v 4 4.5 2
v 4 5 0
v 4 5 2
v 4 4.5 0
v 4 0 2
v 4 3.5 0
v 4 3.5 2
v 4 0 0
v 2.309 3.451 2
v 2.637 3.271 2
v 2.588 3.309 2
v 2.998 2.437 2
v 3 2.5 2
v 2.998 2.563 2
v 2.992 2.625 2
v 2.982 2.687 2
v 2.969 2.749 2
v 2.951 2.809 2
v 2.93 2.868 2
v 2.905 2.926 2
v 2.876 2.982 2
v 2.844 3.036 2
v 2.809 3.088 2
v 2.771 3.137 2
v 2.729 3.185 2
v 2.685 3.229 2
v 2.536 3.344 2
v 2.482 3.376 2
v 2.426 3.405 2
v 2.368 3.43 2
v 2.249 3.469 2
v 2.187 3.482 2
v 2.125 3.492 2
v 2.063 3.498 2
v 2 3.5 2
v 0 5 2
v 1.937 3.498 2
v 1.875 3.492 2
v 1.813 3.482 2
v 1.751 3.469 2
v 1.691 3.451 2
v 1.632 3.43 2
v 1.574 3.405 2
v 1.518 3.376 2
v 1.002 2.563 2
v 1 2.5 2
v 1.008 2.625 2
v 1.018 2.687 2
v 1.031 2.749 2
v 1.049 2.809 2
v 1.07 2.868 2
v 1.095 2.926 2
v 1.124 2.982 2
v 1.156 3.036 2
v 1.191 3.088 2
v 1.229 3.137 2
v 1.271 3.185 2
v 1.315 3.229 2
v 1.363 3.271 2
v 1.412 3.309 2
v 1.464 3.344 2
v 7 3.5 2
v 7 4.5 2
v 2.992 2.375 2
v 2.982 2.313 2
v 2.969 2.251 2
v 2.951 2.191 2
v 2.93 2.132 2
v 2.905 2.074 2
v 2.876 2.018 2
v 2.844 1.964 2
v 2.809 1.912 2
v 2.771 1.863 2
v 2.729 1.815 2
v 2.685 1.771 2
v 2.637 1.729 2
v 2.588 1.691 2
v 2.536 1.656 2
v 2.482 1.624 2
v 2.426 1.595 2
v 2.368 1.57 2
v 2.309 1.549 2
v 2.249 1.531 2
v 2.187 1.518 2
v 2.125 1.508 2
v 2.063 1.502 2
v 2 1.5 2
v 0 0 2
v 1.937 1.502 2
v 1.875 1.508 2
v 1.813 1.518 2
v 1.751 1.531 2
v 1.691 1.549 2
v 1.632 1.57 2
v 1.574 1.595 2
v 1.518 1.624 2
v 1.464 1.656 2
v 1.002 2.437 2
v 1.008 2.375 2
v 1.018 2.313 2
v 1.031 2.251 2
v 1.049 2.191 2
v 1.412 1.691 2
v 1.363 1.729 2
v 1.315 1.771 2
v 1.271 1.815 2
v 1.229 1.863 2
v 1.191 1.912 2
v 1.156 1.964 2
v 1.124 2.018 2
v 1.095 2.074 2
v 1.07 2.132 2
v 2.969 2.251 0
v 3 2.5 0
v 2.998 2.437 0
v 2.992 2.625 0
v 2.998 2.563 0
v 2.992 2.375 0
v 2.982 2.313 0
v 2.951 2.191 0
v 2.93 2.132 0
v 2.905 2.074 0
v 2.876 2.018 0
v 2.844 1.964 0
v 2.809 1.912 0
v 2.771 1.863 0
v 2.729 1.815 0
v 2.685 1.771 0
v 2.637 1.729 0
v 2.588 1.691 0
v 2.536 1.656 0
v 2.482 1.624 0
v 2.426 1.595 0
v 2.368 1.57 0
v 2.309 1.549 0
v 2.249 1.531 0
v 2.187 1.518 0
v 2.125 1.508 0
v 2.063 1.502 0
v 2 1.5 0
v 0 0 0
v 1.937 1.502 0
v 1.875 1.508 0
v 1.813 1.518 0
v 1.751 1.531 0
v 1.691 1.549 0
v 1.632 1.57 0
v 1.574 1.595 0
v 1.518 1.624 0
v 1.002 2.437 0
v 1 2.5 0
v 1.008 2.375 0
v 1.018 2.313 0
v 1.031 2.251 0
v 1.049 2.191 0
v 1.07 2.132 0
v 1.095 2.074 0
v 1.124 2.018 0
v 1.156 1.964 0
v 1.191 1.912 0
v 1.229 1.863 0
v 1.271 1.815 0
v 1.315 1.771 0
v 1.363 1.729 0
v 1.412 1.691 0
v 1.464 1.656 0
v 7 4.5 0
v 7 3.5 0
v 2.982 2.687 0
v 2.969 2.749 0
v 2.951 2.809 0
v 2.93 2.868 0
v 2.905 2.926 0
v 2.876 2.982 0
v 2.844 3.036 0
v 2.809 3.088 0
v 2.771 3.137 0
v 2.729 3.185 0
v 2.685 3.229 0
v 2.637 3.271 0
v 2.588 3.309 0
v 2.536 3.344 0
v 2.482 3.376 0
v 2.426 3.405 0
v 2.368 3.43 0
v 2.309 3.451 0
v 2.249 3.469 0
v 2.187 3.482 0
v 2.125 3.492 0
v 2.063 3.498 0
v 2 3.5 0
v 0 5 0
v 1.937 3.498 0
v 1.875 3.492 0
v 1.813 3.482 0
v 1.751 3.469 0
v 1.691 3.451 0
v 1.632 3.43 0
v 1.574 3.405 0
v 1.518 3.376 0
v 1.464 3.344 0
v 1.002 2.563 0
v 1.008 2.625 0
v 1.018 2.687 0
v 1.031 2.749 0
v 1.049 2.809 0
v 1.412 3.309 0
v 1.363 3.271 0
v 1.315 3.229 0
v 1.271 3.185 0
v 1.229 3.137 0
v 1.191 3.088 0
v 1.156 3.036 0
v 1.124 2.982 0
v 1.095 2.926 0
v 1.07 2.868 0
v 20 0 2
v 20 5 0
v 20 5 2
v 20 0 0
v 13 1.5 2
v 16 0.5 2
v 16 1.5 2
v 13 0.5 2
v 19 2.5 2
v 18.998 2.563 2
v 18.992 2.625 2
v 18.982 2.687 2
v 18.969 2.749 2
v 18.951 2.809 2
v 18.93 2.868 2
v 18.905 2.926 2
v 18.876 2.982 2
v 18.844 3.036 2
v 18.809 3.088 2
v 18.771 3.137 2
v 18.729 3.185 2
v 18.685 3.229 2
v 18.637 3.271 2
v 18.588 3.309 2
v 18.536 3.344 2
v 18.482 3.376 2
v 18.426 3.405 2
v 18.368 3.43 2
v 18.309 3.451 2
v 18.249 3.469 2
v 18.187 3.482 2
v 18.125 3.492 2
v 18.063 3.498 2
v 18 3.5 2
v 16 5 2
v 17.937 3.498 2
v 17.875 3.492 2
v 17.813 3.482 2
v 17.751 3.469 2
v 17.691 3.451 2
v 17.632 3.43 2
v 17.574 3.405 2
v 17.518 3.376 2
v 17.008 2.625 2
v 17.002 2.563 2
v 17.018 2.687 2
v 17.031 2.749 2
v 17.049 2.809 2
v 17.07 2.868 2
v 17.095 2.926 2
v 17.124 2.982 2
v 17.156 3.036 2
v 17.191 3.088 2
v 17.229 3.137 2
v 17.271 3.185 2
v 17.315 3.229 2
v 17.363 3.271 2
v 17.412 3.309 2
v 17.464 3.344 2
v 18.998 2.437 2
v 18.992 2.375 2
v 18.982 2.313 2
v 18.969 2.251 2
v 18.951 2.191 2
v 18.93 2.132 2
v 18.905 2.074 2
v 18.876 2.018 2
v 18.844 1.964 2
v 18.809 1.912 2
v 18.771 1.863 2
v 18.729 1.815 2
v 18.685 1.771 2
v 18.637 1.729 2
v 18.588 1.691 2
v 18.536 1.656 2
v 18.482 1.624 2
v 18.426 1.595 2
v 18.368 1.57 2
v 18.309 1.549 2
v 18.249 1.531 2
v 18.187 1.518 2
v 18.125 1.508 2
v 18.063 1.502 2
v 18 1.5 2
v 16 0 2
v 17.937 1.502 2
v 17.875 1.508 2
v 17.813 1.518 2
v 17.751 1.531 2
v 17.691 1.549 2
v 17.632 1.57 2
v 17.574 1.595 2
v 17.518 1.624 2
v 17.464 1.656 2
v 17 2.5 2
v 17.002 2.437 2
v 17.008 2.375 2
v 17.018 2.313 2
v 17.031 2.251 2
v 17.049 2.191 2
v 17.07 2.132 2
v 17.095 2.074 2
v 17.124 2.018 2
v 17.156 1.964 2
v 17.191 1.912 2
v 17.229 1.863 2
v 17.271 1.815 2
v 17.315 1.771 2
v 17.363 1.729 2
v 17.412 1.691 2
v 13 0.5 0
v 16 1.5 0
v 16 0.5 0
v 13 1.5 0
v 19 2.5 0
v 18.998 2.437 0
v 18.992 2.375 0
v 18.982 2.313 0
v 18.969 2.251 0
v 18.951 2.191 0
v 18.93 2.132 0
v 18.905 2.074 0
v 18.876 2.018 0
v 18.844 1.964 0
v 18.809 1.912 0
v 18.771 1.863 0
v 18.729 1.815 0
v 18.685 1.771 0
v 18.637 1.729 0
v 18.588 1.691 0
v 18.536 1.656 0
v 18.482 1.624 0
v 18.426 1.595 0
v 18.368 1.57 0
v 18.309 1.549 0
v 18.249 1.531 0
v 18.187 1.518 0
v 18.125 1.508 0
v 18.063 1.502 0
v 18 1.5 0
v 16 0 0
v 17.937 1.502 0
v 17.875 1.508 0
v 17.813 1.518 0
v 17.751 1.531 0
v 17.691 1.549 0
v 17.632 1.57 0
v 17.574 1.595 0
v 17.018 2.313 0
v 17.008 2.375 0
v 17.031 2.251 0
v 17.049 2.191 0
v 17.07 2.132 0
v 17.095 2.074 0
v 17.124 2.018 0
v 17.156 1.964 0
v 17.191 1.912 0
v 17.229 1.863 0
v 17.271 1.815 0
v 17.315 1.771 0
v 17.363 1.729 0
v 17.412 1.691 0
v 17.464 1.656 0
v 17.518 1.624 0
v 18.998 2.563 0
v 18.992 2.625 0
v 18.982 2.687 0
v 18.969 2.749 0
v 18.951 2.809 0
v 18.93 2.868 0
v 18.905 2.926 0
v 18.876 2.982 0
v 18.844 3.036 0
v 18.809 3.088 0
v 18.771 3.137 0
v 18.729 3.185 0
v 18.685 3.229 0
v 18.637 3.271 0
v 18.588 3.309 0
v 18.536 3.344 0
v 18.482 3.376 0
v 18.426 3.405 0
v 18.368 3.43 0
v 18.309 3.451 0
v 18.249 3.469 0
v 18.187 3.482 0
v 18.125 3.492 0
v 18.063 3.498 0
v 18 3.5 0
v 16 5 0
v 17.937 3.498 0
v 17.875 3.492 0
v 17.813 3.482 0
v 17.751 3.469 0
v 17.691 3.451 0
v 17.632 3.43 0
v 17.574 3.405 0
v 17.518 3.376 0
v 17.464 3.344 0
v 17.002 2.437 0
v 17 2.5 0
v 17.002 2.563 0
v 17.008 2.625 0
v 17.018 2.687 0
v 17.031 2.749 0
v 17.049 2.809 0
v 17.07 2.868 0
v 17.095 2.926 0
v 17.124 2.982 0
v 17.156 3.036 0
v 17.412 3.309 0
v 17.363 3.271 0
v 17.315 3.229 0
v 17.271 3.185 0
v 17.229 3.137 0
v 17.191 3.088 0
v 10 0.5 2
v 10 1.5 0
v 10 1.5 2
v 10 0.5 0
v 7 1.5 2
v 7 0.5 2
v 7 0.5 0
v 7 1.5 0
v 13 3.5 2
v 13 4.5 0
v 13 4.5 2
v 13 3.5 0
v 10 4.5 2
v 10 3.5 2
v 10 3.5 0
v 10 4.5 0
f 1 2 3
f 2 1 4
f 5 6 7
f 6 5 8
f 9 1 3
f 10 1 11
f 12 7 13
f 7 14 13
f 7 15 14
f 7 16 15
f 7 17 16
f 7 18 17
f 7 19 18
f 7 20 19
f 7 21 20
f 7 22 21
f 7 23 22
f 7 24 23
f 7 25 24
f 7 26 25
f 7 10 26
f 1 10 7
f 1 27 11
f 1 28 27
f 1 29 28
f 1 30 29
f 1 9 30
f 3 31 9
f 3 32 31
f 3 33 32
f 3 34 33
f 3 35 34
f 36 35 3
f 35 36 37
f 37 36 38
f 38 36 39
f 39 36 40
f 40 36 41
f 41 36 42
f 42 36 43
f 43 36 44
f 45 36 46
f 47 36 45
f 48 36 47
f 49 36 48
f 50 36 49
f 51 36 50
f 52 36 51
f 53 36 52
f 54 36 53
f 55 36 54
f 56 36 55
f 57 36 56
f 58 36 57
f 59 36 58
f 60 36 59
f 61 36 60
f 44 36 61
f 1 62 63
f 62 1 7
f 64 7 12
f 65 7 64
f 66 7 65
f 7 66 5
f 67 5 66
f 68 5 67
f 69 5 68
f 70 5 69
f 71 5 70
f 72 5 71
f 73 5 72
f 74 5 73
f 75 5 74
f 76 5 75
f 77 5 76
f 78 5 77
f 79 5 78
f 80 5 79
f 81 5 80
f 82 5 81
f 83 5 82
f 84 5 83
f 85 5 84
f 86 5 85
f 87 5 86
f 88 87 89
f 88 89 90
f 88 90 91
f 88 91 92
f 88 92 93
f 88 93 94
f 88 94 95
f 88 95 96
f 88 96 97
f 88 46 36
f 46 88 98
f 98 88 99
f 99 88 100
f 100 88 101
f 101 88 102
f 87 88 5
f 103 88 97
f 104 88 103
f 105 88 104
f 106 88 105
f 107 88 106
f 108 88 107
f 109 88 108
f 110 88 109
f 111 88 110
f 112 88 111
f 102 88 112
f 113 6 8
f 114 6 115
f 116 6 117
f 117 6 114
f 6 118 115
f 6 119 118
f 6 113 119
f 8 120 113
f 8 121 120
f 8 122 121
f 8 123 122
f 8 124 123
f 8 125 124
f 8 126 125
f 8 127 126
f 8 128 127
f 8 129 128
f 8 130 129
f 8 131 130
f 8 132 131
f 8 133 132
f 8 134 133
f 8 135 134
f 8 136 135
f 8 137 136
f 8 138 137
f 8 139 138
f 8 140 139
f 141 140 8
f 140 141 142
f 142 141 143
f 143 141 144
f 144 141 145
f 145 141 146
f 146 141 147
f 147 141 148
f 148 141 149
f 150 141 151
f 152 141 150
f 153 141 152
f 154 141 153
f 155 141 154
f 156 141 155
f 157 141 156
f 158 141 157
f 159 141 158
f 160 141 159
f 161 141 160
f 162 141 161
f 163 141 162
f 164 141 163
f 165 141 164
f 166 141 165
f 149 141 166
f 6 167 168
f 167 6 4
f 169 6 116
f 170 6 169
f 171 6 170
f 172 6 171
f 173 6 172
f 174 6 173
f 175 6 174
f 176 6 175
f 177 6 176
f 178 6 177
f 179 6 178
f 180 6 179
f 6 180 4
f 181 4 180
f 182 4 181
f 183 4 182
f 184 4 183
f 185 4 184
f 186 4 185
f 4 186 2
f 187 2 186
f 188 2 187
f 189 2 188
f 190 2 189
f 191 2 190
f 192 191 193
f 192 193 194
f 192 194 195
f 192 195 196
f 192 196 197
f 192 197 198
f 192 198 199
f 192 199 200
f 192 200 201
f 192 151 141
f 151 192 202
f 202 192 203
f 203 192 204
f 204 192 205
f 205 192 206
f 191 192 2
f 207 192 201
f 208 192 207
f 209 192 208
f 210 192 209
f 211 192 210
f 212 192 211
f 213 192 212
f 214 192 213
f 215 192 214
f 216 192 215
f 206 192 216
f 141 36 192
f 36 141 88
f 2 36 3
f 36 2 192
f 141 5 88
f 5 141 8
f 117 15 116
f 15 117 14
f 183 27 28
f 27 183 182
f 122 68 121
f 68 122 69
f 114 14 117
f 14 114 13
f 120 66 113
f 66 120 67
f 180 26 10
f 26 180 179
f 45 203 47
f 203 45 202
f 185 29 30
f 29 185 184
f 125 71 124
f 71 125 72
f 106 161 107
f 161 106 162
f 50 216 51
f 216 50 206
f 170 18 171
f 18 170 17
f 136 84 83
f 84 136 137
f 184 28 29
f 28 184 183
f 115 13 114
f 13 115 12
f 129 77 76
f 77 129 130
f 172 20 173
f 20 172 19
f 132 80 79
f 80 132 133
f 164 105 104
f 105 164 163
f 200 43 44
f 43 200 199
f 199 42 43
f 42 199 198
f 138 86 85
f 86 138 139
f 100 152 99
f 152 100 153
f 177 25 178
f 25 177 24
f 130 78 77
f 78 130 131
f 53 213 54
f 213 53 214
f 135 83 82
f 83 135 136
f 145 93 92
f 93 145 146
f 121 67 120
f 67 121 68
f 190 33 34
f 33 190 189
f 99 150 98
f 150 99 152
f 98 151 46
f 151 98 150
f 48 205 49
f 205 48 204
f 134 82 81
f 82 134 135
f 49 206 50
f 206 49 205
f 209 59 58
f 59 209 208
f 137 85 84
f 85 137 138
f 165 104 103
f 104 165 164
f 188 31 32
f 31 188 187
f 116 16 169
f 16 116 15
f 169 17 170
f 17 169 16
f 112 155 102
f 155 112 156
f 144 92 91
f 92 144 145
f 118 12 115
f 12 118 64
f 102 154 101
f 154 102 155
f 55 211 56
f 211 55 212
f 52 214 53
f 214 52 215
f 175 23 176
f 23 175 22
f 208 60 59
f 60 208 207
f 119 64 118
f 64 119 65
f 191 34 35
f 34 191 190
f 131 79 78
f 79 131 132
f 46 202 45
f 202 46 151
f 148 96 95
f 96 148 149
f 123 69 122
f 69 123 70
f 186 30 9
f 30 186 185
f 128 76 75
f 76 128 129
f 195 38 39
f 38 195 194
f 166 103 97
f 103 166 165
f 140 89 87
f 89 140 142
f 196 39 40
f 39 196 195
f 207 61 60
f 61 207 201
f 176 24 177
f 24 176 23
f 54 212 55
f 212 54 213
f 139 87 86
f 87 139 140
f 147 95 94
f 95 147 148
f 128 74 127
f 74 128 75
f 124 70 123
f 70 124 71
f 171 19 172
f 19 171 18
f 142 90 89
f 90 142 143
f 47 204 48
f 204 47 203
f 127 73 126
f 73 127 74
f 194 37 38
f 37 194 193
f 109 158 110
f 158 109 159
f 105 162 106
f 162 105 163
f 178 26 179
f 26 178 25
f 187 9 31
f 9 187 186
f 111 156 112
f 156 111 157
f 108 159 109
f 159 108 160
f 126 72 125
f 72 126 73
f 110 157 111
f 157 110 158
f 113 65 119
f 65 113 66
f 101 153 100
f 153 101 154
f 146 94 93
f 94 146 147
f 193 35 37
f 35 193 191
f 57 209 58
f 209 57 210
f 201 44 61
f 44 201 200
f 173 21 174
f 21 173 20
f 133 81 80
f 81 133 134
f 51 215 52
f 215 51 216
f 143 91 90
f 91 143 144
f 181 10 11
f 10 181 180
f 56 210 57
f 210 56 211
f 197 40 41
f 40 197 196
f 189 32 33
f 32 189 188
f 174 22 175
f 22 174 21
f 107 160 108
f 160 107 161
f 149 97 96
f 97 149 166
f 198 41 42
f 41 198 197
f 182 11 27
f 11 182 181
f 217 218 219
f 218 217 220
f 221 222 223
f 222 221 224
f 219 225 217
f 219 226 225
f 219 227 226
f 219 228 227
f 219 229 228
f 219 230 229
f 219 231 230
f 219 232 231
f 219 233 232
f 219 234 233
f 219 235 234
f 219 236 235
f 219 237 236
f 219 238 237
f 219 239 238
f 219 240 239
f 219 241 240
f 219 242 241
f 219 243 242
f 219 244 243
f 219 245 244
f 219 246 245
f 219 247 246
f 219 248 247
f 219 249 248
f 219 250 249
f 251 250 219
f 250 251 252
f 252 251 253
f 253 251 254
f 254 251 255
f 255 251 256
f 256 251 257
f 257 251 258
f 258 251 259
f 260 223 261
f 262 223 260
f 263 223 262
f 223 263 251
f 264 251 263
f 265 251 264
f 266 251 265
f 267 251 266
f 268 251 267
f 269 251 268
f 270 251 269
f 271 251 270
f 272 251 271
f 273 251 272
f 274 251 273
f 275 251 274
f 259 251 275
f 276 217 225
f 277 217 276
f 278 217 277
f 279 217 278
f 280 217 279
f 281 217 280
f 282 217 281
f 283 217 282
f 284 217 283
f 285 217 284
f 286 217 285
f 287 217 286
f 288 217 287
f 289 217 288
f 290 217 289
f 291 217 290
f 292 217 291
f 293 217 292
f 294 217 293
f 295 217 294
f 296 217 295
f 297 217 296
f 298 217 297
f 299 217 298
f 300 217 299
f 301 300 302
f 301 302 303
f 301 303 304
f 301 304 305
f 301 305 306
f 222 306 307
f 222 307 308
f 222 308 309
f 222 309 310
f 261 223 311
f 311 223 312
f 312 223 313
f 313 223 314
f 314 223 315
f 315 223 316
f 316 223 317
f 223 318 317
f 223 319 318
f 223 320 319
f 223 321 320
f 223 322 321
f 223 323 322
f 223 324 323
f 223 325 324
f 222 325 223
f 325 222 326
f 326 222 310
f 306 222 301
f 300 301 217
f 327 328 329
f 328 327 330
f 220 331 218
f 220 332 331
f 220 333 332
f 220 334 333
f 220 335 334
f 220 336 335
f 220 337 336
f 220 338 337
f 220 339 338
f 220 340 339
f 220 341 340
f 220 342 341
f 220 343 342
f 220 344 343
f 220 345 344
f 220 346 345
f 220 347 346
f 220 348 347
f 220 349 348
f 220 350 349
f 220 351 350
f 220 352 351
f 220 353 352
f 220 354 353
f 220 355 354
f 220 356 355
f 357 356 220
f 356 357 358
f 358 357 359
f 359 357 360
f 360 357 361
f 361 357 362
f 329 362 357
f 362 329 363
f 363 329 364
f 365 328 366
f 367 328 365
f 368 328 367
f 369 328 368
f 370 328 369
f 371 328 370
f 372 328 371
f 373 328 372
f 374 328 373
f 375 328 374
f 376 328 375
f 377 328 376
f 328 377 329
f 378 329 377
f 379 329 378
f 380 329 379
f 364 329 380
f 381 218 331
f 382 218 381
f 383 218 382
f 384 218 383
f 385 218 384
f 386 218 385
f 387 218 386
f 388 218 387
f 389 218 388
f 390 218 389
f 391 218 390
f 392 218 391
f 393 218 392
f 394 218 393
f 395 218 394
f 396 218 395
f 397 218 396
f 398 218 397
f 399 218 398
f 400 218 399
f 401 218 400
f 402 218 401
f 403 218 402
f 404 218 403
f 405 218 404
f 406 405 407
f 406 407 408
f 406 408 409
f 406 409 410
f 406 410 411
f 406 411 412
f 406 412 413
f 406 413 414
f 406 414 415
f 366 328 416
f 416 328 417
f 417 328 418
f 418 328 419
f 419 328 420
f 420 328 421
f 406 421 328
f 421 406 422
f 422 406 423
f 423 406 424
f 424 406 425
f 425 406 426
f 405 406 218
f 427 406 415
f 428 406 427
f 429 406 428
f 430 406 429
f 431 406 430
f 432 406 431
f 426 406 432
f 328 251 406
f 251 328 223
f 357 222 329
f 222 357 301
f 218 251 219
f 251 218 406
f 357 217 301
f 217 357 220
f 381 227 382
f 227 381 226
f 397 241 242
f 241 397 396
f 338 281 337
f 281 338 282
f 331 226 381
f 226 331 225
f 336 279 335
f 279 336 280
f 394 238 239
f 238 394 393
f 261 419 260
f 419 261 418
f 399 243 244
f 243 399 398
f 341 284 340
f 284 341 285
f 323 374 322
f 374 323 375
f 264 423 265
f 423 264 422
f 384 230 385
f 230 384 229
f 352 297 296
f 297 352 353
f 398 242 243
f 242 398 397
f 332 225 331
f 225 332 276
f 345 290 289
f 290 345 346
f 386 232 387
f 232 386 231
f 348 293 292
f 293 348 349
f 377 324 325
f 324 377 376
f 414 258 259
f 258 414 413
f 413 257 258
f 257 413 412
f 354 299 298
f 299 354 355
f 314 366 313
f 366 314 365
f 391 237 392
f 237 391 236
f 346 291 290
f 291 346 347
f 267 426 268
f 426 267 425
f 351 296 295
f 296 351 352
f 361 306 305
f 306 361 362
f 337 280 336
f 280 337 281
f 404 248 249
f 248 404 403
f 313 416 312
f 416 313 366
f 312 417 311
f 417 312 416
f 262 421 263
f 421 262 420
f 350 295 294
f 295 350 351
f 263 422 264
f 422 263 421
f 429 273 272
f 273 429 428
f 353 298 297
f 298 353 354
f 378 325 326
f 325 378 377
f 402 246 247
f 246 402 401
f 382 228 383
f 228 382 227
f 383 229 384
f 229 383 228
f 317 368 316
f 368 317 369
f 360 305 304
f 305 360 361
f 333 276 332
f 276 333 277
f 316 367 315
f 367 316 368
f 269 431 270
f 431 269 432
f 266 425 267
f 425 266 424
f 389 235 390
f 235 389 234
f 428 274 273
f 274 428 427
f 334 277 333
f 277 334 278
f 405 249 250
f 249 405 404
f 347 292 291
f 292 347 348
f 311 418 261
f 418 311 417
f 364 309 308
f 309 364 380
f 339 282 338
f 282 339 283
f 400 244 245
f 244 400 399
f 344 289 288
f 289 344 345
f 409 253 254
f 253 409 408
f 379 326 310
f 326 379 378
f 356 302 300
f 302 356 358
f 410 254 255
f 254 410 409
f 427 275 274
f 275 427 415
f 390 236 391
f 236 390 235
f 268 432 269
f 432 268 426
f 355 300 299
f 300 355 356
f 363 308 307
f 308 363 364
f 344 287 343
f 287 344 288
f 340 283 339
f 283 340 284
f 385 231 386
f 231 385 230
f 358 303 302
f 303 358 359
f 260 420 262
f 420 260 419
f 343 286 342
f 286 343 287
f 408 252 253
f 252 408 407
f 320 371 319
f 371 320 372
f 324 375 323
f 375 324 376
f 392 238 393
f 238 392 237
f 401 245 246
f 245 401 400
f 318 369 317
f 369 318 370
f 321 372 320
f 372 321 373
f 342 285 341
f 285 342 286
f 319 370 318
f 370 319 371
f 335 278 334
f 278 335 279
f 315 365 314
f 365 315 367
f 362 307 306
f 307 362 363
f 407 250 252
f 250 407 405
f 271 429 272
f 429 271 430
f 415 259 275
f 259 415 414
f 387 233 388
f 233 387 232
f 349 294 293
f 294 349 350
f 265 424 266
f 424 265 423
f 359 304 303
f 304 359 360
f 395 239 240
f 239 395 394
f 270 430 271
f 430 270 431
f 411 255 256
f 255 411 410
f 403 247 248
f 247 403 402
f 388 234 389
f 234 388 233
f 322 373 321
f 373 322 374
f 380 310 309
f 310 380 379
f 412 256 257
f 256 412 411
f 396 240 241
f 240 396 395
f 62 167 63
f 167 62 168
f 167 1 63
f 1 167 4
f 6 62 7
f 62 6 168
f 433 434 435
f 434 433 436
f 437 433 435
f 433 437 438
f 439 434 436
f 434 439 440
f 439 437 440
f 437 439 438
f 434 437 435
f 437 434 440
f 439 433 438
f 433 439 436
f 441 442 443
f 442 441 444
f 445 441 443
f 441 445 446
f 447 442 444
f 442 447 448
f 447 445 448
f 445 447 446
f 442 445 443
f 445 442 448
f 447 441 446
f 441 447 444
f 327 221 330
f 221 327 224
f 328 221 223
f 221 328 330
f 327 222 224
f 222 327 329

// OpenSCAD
union() {
  union() {
    union() {
      union() {
        union() {
          difference() {
            cube([4.0, 5.0, 2.0]);
            translate([2.0, 0, 0]) {
              translate([0, 2.5, 0]) {
                linear_extrude(height = 2.0) {
                  circle(r = 1.0, $fn = 100);
                }
              }
            }
          }
          difference() {
            translate([16.0, 0, 0]) {
              cube([4.0, 5.0, 2.0]);
            }
            translate([18.0, 0, 0]) {
              translate([0, 2.5, 0]) {
                linear_extrude(height = 2.0) {
                  circle(r = 1.0, $fn = 100);
                }
              }
            }
          }
        }
        translate([4.0, 0, 0]) {
          translate([0, 3.5, 0]) {
            cube([3.0, 1.0, 2.0]);
          }
        }
      }
      translate([7.0, 0, 0]) {
        translate([0, 0.5, 0]) {
          cube([3.0, 1.0, 2.0]);
        }
      }
    }
    translate([10.0, 0, 0]) {
      translate([0, 3.5, 0]) {
        cube([3.0, 1.0, 2.0]);
      }
    }
  }
  translate([13.0, 0, 0]) {
    translate([0, 0.5, 0]) {
      cube([3.0, 1.0, 2.0]);
    }
  }
}
$fn = 50;
